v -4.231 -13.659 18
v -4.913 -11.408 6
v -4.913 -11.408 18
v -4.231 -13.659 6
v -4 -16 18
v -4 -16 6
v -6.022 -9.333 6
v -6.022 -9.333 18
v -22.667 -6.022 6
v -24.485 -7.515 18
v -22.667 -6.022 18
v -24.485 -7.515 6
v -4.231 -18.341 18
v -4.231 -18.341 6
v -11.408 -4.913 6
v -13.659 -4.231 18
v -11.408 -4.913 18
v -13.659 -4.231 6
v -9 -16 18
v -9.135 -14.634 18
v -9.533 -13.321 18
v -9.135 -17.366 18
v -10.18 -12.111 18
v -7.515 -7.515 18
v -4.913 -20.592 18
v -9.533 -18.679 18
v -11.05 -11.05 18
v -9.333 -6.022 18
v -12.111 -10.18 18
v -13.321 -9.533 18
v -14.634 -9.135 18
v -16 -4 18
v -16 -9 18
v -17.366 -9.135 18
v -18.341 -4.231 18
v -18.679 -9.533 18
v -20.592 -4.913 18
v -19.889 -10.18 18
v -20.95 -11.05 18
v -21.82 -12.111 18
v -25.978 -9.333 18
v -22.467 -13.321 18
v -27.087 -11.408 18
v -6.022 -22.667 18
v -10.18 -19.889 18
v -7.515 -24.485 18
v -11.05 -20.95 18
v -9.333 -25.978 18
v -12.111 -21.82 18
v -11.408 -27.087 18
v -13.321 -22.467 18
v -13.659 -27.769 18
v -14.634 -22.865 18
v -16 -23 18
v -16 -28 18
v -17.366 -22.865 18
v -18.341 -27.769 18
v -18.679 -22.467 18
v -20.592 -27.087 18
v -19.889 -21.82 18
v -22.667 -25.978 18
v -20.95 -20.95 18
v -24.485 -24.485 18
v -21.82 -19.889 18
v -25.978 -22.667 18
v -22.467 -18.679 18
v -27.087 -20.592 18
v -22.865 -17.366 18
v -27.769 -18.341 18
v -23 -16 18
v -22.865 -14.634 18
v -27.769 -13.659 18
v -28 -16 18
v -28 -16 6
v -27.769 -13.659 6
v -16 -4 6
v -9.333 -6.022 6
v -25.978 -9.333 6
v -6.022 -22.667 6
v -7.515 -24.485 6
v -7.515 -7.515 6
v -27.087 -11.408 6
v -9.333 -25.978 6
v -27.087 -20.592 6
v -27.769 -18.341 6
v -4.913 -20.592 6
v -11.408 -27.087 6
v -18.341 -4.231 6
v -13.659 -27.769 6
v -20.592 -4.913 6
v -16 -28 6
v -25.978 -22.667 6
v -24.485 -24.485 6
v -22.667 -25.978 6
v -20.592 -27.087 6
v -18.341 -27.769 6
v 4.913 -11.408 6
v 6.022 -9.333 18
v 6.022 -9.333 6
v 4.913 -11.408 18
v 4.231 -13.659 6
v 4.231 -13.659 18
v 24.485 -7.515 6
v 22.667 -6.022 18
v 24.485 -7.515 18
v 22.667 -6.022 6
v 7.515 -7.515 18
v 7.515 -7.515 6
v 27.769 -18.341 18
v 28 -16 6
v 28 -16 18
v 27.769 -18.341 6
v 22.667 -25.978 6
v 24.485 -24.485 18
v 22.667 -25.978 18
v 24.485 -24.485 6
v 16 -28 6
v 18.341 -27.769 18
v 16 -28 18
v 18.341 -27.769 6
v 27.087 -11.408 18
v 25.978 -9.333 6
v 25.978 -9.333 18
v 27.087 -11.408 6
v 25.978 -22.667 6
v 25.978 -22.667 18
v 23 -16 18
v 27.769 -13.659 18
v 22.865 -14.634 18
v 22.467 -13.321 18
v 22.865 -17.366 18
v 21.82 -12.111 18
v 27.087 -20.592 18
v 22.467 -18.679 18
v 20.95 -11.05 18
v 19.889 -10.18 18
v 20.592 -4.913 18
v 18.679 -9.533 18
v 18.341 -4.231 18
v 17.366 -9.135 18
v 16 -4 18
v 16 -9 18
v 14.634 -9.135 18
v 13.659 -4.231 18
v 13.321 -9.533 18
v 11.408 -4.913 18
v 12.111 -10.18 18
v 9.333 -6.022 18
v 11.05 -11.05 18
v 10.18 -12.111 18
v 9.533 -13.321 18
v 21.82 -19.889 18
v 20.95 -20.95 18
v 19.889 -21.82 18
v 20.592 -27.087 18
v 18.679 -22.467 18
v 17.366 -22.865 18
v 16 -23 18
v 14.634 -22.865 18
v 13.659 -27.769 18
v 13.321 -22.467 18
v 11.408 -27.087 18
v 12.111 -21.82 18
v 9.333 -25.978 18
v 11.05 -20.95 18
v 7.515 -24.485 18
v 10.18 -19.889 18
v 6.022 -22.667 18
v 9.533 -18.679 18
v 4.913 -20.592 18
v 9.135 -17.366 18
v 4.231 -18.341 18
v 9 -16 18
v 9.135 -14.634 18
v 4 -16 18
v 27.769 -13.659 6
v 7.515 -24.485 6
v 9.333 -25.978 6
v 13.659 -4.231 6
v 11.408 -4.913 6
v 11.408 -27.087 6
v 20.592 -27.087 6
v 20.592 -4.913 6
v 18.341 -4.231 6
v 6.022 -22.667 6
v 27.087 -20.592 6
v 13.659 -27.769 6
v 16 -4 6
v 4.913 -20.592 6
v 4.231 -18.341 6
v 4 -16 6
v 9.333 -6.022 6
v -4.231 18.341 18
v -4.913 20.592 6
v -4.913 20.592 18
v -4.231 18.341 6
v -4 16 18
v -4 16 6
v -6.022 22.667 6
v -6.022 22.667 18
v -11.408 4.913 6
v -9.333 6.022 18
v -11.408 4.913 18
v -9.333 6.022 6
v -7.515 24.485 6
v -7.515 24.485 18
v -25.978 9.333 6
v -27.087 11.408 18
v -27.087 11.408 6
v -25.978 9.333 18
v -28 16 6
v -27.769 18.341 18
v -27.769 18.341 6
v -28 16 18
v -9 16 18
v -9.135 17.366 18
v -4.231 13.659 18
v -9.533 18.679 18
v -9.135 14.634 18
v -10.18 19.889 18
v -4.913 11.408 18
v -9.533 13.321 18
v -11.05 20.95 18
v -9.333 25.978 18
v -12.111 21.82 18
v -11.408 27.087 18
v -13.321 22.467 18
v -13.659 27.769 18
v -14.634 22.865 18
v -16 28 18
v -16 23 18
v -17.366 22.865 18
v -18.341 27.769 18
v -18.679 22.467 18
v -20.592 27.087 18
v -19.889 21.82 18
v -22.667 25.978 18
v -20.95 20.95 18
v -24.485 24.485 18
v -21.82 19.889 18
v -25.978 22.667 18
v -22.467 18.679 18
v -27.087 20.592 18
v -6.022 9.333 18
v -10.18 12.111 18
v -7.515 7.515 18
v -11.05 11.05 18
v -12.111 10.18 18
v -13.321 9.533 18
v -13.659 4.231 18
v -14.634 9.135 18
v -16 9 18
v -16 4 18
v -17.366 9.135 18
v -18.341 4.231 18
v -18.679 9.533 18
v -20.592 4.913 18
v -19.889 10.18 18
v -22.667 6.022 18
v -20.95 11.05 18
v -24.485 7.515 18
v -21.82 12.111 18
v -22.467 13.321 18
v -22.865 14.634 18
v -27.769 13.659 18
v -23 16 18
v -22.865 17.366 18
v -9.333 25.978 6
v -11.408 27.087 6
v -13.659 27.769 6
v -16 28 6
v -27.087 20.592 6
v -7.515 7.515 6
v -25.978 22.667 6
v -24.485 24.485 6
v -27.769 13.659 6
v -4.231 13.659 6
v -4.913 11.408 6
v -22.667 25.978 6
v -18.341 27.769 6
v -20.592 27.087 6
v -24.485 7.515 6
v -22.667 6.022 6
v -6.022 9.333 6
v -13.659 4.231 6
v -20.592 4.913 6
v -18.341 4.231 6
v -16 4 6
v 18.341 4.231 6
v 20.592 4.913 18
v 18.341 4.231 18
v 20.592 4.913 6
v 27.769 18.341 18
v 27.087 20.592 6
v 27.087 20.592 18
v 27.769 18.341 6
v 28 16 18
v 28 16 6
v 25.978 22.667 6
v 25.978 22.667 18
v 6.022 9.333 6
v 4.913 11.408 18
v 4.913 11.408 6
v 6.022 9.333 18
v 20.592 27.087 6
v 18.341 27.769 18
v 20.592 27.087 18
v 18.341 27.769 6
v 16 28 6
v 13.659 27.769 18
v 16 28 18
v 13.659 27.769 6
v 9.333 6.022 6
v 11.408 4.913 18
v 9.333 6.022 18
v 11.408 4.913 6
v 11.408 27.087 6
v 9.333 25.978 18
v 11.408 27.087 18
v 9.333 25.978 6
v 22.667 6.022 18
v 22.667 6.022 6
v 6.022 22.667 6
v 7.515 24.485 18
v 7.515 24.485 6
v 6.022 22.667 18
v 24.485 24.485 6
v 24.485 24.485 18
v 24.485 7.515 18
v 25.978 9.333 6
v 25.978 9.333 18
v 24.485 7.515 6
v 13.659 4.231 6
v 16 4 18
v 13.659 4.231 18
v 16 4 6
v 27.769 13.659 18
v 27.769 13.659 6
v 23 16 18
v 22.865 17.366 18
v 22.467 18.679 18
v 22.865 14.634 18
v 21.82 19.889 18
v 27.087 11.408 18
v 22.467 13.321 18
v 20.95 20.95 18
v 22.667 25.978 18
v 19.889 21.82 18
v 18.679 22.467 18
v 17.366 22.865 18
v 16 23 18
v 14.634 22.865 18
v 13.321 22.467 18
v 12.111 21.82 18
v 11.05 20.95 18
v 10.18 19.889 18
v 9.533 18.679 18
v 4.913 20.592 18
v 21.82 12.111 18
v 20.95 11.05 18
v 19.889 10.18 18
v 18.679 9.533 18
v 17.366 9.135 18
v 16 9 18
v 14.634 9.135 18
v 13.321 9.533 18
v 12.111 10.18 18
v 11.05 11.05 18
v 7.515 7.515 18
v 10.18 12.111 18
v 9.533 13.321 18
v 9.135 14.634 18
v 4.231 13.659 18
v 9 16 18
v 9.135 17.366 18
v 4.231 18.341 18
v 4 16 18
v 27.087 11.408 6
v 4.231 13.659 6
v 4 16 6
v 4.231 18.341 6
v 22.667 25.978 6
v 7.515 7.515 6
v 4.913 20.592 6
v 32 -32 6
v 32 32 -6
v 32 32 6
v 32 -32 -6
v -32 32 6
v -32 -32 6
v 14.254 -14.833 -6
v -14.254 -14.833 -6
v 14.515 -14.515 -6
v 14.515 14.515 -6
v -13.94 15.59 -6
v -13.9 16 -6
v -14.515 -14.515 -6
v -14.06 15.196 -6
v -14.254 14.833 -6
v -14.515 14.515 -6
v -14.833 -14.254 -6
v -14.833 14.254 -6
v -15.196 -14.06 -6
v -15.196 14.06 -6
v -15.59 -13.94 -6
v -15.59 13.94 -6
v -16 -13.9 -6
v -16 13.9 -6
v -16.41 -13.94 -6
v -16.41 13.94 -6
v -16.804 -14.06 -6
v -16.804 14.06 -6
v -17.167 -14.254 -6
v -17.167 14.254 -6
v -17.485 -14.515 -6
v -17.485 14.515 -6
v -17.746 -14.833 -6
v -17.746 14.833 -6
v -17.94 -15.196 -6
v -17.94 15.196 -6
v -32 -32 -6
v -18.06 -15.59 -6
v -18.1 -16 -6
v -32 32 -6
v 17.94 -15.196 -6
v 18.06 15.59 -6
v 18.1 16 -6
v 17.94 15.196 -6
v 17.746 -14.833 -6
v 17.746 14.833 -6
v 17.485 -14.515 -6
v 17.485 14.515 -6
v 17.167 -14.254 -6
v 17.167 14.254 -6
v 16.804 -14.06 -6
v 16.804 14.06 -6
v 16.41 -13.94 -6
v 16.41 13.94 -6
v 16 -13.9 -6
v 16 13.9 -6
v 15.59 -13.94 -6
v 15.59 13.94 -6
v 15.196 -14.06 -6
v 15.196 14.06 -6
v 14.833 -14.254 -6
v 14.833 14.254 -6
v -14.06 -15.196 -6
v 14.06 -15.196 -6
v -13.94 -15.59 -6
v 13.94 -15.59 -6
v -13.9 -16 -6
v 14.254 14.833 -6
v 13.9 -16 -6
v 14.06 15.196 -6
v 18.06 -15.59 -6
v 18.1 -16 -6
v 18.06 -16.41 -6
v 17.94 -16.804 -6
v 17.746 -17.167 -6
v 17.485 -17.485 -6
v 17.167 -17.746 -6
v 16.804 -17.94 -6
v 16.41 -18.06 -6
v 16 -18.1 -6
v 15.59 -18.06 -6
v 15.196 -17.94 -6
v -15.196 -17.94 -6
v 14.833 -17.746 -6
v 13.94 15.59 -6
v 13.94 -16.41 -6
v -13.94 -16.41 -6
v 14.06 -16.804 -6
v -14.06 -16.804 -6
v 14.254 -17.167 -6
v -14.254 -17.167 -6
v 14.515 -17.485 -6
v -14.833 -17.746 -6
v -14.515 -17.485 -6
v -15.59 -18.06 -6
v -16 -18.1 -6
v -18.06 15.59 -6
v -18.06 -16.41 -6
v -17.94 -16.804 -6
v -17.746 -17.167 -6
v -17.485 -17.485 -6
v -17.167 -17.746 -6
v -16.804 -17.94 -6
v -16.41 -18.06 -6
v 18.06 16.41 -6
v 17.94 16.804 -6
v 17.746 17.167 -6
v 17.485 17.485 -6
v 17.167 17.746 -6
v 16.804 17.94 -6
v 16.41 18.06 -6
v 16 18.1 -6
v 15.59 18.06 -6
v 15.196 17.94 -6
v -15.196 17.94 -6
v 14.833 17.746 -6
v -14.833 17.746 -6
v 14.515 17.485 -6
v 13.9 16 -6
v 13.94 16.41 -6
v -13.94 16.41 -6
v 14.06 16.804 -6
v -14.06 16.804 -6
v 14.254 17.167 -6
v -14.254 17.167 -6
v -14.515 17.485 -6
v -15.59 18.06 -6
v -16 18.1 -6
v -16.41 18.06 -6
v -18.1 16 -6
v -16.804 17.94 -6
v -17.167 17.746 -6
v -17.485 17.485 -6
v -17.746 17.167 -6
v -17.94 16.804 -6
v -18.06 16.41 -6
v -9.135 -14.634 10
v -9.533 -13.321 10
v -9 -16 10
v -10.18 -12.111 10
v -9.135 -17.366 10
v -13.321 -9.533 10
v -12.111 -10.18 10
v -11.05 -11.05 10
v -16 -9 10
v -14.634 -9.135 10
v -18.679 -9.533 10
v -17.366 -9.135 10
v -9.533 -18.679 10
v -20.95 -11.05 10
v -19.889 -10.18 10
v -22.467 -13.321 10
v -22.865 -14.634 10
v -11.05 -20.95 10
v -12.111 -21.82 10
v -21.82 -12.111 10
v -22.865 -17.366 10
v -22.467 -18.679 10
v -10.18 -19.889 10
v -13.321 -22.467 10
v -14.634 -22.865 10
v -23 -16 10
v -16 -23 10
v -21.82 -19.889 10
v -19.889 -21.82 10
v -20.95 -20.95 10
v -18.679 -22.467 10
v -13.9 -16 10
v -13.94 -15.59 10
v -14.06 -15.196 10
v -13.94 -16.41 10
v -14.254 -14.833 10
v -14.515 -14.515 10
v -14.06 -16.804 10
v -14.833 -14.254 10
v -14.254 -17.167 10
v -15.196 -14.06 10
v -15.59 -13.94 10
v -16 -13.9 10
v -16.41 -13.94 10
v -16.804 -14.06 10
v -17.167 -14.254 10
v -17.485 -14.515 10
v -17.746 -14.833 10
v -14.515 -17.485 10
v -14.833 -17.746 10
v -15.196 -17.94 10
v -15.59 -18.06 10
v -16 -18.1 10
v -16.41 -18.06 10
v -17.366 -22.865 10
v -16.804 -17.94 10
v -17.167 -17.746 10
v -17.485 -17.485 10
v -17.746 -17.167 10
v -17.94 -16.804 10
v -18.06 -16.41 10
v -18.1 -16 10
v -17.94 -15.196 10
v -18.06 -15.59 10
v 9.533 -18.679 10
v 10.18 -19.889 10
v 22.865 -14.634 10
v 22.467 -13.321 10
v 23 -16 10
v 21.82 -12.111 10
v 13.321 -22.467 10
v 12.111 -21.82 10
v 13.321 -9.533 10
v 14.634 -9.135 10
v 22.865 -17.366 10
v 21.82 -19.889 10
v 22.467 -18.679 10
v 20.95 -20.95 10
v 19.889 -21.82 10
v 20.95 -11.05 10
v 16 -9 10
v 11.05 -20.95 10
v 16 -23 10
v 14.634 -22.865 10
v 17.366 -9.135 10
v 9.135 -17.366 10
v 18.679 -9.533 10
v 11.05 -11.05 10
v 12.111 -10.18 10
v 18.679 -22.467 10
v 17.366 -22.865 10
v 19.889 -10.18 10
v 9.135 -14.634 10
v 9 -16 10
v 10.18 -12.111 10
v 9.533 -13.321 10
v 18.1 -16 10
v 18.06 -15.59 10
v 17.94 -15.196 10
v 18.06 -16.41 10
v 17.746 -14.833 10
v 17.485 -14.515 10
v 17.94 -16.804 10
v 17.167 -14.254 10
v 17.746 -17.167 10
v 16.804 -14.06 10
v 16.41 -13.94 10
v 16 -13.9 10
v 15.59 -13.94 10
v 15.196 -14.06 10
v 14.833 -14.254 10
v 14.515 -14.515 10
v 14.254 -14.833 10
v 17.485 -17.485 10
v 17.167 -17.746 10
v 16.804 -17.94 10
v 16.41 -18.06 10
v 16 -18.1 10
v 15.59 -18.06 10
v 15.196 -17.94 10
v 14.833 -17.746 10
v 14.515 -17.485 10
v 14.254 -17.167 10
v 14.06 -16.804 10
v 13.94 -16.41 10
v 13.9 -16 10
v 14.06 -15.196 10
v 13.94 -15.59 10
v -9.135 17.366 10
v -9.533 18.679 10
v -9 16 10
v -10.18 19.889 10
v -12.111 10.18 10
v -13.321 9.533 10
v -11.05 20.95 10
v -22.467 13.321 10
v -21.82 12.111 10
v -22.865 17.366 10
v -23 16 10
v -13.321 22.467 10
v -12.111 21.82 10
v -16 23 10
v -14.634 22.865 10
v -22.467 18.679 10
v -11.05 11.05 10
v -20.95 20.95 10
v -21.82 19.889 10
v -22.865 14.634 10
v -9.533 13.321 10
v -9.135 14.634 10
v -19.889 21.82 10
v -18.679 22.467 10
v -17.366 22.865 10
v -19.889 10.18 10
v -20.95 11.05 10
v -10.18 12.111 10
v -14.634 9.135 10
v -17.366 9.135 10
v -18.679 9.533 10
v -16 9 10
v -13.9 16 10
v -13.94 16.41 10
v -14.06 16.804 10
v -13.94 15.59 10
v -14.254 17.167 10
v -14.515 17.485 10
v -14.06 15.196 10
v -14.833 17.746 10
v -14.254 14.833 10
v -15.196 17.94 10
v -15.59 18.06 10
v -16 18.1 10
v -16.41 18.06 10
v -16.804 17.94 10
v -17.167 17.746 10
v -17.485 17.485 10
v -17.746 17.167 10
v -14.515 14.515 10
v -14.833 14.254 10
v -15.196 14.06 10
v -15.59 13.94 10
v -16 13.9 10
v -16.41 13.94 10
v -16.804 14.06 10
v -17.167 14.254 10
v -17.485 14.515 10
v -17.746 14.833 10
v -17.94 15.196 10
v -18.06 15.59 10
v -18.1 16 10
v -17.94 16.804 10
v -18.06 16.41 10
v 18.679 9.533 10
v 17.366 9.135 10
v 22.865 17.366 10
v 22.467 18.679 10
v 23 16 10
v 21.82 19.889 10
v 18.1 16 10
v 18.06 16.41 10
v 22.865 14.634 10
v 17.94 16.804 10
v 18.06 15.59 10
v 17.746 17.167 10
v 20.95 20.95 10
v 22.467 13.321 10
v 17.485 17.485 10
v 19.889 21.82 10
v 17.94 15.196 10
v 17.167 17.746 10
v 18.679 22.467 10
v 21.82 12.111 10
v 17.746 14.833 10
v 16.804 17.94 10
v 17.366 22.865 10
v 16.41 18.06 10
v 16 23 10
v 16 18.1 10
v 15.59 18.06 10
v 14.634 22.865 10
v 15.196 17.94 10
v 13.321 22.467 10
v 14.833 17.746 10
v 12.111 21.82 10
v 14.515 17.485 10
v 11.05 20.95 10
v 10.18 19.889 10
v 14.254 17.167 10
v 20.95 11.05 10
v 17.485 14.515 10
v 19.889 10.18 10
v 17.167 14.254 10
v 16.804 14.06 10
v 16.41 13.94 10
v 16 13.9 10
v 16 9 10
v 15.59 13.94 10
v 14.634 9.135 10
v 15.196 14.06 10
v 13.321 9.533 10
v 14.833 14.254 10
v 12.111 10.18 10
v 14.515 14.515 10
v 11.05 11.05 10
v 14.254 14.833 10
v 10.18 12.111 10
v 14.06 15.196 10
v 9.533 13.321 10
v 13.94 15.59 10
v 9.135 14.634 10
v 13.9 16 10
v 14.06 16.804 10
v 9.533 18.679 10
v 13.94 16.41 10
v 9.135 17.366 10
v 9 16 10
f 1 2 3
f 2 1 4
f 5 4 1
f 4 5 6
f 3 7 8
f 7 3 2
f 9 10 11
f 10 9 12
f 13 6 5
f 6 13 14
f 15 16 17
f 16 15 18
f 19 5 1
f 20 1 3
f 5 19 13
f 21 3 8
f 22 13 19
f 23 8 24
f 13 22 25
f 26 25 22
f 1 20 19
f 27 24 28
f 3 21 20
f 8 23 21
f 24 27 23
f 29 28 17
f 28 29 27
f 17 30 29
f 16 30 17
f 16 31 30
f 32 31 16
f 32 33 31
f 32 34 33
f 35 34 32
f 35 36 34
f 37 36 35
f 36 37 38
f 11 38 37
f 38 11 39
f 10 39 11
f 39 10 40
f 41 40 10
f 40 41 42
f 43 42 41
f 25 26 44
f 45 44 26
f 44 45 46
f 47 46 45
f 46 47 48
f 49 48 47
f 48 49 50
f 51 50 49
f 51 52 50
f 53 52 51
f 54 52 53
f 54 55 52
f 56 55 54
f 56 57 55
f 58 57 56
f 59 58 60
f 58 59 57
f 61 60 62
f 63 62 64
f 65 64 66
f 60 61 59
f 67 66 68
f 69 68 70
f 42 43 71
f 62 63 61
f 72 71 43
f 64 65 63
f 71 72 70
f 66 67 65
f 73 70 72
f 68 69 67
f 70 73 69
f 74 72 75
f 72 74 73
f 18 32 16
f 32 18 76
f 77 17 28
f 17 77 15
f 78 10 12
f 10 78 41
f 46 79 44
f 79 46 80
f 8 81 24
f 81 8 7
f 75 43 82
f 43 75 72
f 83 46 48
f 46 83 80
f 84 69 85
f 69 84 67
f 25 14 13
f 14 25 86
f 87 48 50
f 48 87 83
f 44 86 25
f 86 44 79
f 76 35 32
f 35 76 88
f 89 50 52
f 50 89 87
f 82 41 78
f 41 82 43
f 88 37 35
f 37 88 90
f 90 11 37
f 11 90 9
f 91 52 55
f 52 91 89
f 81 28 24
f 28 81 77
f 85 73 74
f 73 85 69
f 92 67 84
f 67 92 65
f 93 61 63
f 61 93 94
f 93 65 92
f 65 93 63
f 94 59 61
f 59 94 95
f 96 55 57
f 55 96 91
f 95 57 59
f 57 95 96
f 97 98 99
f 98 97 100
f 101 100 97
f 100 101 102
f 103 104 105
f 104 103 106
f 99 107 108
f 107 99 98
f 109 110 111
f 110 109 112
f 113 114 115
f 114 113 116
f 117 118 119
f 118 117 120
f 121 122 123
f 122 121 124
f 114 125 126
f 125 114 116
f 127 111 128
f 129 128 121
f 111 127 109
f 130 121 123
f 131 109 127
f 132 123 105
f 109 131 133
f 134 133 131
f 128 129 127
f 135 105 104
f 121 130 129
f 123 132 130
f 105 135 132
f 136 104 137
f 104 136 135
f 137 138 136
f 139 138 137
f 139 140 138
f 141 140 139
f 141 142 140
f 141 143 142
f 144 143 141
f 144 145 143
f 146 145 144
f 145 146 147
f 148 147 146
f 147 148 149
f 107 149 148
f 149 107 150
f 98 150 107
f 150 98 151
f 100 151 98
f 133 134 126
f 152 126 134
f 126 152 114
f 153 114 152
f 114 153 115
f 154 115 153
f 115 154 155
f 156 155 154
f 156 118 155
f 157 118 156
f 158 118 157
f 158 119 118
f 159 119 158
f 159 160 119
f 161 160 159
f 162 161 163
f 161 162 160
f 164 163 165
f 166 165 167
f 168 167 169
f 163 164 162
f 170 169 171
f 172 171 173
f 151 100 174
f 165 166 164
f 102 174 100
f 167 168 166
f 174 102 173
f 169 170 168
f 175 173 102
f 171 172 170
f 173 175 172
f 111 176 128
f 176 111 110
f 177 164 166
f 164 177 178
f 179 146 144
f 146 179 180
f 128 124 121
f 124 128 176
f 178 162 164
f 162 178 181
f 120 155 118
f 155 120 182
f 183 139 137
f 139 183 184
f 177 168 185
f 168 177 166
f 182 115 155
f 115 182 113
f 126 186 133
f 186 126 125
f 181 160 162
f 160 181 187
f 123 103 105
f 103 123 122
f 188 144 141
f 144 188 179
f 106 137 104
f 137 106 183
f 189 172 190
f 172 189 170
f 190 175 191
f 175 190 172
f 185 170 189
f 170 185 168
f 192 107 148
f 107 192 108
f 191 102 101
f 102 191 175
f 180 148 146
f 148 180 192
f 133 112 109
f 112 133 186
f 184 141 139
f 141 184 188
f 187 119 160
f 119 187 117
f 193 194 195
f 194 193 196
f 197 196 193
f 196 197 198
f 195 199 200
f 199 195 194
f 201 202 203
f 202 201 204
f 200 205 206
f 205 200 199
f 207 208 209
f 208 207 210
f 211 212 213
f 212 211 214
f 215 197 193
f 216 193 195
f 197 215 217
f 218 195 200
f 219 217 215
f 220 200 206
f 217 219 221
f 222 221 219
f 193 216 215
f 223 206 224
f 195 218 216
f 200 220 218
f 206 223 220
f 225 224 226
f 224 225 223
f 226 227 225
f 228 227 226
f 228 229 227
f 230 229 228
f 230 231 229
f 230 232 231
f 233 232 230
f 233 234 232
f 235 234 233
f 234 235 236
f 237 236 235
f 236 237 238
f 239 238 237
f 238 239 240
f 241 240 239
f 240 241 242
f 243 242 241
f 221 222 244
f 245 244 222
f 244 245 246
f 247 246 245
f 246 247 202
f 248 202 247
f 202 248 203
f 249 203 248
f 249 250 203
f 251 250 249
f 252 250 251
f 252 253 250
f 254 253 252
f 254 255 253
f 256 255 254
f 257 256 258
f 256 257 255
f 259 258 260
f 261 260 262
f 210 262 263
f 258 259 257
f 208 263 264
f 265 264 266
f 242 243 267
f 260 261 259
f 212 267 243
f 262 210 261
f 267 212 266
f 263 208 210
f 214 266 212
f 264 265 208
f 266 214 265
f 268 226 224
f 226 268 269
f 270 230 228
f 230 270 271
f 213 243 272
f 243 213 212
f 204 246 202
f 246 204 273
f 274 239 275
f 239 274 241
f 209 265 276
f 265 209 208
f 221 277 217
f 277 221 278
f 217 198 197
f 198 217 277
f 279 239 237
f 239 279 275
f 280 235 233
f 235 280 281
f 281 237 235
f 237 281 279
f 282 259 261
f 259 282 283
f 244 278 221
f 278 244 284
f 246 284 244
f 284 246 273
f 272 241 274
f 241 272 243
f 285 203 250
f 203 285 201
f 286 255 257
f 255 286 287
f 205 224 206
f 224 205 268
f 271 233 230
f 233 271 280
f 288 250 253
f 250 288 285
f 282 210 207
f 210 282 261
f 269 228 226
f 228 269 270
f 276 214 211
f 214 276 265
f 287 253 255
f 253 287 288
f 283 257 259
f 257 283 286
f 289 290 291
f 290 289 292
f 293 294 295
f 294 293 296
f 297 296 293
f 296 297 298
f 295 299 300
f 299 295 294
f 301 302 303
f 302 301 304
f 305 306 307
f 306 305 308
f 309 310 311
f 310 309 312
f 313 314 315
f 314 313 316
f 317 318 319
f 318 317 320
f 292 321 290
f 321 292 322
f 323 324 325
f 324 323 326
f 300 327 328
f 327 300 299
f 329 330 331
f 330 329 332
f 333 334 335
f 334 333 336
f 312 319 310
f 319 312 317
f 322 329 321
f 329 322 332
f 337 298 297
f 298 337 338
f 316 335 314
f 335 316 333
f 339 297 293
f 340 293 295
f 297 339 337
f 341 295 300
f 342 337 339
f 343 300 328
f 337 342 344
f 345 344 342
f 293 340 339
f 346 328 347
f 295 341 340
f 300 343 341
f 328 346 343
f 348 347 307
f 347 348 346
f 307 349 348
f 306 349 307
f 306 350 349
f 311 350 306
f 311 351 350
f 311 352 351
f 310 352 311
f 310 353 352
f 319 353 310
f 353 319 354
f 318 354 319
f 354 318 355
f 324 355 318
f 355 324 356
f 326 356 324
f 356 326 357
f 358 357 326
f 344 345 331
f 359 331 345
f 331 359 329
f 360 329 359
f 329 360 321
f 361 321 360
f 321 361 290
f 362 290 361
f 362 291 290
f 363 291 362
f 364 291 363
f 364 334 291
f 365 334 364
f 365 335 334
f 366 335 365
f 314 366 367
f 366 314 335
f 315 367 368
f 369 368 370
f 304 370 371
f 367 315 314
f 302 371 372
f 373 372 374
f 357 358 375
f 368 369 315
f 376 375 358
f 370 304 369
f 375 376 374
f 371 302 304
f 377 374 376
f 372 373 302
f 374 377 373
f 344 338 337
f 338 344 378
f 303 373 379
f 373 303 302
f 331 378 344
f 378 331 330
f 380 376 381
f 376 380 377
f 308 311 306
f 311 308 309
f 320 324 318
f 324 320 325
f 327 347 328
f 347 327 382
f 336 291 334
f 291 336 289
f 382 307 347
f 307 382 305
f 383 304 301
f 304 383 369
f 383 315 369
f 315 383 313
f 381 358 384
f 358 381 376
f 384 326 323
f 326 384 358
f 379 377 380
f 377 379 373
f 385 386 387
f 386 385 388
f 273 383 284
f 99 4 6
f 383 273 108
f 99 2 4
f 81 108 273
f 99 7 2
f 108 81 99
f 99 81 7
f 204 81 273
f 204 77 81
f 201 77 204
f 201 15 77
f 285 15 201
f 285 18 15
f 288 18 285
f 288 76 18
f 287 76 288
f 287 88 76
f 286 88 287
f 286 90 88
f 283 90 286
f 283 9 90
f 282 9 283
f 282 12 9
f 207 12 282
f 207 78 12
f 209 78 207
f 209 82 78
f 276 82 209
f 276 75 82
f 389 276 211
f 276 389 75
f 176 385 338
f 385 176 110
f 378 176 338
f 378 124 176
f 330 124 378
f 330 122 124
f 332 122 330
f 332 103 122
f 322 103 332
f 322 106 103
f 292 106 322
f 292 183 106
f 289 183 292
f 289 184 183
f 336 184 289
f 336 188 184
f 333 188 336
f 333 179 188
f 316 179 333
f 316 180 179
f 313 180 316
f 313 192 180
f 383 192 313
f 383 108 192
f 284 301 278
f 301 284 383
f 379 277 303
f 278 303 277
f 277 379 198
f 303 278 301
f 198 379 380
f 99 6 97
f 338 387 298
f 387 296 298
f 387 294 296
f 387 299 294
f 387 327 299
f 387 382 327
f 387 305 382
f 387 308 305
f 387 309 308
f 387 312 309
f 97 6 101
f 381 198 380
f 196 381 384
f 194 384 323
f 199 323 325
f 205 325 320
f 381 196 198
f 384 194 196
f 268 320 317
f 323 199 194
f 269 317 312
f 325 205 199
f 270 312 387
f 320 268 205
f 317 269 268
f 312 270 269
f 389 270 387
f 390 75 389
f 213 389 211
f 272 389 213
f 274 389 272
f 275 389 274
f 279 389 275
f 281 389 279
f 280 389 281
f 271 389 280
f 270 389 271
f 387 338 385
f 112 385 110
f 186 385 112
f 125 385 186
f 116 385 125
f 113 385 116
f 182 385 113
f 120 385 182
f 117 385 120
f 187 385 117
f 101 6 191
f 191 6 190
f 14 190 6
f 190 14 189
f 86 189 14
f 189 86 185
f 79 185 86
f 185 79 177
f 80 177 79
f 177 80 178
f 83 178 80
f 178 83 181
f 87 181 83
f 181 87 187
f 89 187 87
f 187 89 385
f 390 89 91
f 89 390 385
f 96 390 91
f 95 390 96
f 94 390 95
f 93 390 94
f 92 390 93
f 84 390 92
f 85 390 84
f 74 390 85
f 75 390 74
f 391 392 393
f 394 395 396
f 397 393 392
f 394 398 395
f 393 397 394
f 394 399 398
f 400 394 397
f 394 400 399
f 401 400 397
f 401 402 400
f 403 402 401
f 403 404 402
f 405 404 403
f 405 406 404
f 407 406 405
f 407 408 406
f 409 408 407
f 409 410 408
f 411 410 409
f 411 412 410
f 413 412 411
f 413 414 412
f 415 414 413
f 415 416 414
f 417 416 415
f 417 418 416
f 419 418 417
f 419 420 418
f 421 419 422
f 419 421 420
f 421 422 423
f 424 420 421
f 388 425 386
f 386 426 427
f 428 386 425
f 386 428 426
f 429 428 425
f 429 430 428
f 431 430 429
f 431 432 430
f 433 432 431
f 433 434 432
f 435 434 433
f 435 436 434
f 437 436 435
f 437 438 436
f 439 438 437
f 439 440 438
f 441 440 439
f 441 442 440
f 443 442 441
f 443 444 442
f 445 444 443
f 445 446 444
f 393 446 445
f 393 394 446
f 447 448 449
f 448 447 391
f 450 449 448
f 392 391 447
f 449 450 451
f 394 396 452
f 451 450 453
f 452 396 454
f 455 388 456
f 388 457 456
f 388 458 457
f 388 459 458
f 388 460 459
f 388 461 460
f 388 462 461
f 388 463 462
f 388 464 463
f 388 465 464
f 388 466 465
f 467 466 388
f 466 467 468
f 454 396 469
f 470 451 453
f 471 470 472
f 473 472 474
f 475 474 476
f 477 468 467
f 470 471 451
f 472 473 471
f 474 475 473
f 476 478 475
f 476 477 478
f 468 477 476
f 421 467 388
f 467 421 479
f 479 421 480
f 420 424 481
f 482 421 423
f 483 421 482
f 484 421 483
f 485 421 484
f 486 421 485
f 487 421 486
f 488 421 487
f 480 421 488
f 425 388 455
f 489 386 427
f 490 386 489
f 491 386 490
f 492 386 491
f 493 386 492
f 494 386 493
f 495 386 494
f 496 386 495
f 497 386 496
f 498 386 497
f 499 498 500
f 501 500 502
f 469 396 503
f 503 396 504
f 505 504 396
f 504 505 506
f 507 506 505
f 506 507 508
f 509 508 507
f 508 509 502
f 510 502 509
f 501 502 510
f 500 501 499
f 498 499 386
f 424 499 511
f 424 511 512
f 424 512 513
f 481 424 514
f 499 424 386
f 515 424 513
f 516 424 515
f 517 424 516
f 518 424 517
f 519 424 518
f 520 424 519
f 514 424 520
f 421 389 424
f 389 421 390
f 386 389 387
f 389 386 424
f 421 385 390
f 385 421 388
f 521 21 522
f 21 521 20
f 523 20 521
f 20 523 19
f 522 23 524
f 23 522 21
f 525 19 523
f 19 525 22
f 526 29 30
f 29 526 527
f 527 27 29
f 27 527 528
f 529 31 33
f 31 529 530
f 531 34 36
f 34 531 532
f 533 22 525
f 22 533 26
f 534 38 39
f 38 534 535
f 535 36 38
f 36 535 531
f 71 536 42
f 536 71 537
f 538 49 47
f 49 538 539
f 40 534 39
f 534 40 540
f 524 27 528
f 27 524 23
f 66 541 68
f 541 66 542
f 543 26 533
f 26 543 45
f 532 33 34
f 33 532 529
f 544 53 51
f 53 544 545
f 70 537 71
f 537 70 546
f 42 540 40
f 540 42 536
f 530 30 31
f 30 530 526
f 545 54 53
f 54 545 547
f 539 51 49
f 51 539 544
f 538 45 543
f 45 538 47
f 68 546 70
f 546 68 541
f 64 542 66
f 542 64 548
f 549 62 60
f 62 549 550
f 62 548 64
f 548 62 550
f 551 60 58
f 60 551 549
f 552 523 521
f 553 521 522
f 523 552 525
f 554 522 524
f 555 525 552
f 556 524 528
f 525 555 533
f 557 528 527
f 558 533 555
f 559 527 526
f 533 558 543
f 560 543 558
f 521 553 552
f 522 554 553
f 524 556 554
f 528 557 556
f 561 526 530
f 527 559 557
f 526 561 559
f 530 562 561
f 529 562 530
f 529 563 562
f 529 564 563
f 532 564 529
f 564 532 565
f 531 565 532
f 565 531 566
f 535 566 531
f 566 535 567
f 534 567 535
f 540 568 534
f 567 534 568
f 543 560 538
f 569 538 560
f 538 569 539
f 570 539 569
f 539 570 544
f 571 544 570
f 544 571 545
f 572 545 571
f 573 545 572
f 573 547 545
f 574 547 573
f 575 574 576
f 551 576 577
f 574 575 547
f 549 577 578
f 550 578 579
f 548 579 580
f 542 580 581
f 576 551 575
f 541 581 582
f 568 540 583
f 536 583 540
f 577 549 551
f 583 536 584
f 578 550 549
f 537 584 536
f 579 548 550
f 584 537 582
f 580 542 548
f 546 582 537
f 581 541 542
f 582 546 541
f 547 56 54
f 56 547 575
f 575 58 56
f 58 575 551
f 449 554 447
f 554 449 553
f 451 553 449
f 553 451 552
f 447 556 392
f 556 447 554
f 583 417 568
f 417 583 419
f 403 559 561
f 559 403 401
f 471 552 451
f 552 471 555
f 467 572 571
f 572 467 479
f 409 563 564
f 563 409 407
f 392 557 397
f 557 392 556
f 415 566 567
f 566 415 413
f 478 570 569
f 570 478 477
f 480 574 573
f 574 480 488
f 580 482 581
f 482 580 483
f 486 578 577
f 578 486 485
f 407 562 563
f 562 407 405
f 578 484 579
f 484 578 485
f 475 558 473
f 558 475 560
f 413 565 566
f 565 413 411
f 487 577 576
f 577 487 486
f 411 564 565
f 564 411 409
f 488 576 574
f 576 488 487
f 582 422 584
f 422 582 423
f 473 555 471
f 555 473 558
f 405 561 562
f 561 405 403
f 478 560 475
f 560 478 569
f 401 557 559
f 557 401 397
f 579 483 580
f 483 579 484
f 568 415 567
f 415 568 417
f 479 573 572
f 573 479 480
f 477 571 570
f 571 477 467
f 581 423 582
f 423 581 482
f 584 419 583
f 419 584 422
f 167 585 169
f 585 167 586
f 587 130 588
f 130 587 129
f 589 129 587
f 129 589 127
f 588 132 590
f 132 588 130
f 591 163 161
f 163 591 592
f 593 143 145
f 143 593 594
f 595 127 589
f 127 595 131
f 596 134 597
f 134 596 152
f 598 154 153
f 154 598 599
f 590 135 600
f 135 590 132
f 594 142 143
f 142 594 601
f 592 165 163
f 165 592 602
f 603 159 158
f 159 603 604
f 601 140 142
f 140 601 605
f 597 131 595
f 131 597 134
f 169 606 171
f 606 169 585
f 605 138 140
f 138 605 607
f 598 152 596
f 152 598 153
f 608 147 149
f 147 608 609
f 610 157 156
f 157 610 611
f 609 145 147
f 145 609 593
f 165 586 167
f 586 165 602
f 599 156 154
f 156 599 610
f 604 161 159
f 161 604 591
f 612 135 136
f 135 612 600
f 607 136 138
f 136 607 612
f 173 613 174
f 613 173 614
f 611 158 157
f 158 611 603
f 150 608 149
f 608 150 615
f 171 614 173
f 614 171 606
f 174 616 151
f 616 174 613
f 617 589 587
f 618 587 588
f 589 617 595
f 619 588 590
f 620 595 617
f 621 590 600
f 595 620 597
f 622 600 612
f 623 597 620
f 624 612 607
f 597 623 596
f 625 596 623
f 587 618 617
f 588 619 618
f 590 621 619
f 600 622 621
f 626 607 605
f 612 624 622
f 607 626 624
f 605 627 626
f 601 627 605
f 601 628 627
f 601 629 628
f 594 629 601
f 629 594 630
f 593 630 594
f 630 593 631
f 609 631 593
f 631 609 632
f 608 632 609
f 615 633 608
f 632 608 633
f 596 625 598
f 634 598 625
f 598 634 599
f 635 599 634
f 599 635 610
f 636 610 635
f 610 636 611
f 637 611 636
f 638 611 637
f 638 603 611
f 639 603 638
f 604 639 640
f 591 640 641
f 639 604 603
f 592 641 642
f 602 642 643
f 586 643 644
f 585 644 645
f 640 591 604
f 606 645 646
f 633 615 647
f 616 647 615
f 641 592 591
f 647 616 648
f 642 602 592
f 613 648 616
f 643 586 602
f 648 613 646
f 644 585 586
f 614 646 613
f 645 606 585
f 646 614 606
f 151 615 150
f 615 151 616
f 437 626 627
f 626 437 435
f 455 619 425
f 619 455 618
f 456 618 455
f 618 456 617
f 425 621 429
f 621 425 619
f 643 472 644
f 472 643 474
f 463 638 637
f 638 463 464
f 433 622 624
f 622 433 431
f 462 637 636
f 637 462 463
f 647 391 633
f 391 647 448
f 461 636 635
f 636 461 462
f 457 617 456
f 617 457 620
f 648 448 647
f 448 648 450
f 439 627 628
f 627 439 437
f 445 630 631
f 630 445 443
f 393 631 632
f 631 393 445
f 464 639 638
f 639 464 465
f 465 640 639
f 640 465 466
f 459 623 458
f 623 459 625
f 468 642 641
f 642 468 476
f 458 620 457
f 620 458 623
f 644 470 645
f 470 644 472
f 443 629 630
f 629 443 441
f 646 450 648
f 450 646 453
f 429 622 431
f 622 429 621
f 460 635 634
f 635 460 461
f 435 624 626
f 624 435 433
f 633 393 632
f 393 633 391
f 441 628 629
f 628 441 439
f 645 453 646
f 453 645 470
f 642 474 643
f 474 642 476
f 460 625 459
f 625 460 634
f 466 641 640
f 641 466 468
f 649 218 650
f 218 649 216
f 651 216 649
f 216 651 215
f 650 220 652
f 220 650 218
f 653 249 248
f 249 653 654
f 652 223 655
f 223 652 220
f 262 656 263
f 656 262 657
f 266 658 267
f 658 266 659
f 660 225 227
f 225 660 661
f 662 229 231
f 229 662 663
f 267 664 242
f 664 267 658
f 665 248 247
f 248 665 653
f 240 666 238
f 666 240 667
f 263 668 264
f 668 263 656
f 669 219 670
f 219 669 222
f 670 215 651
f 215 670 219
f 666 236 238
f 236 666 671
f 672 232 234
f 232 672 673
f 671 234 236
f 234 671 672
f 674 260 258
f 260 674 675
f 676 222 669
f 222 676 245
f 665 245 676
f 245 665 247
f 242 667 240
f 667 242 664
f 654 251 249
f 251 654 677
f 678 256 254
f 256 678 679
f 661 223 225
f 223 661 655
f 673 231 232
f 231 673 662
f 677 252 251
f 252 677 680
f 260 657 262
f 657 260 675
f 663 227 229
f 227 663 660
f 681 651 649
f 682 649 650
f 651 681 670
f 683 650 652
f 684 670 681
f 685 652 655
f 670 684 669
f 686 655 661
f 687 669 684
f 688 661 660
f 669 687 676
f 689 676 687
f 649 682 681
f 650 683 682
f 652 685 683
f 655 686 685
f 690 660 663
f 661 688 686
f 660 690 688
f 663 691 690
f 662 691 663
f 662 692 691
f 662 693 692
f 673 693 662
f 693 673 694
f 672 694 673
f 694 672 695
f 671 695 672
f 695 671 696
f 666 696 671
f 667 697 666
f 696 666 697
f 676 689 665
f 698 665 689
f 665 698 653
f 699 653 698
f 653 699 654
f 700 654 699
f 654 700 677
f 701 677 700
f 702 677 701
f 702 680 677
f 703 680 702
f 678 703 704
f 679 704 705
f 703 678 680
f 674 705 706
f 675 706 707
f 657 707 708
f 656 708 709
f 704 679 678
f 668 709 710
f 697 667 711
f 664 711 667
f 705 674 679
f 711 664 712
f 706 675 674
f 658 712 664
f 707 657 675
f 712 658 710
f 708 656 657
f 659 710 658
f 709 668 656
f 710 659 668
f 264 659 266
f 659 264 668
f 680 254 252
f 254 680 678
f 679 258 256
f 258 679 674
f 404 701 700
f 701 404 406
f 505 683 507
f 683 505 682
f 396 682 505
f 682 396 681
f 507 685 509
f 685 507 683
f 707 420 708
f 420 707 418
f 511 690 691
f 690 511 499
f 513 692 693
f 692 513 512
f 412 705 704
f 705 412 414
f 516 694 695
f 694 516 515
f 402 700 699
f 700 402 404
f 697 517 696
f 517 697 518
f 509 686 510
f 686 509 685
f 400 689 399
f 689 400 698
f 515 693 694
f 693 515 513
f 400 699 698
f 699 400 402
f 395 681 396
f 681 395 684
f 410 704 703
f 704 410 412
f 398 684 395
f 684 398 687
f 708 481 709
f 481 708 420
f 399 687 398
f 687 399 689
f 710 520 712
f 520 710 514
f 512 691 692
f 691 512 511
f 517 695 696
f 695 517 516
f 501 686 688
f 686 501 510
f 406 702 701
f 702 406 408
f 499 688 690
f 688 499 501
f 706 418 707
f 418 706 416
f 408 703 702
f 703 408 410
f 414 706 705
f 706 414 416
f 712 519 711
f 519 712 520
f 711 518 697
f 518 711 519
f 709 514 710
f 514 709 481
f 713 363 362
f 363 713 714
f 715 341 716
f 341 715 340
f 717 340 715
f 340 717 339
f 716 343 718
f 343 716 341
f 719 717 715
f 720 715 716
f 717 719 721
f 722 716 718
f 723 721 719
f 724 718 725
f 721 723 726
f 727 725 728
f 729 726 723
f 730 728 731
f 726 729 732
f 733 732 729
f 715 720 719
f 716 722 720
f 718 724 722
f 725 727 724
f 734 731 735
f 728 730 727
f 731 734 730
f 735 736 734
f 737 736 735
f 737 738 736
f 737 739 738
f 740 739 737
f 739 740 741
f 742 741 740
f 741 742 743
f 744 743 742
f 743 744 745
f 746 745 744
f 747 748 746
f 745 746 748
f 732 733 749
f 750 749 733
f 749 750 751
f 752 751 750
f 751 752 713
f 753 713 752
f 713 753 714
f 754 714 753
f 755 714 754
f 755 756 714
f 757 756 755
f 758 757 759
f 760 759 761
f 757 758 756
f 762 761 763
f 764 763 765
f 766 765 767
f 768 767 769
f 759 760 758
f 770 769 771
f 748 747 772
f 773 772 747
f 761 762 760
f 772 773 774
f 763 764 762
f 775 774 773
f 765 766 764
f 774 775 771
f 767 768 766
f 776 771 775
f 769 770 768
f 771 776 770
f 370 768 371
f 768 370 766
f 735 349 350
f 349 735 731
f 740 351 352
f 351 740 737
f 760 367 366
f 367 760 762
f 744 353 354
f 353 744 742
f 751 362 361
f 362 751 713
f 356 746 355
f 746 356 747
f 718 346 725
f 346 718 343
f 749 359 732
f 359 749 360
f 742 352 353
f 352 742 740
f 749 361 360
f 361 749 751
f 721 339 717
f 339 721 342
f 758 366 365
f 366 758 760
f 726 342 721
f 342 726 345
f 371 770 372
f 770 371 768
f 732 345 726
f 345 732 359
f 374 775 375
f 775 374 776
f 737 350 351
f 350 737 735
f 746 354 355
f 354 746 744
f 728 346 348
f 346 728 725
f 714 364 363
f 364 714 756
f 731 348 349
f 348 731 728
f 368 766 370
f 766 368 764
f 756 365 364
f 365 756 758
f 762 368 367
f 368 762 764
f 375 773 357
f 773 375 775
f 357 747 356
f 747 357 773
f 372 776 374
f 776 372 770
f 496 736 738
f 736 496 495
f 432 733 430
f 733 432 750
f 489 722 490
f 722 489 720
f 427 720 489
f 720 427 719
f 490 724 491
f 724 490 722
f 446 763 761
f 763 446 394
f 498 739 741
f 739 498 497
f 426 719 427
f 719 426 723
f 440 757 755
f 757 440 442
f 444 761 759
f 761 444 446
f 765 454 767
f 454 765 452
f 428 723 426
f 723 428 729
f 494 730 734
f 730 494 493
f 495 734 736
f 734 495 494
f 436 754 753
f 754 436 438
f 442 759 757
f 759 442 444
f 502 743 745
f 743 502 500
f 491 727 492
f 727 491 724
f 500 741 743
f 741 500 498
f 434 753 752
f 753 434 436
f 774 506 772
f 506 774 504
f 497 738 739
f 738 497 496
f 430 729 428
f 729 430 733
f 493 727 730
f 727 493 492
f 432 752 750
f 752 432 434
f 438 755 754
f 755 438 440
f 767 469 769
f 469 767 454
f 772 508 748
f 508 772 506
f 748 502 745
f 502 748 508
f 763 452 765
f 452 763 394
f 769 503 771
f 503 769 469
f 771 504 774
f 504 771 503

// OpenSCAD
$fn = 32;

// ----------------------------------------------------------------------
// Socket pad plate
// bosses with counterbored sockets for the screws
// ----------------------------------------------------------------------

// --- parameters (mm) ---
base_t = 12;       // base plate thickness
boss_h = 12;       // boss height above the base plate
boss_d = 24;       // boss diameter
socket_d = 14;     // socket diameter
socket_depth = 8;  // socket depth from the boss face
bolt_d = 4.2;      // screw clearance hole through the socket floor
rows = 2;          // boss rows
cols = 2;          // bosses per row
pitch = 32;        // boss pitch

// --- derived feature positions (mm) ---
height = base_t + boss_h;           // = 24   overall height of the part
plate = [pitch * (cols - 1) + boss_d + 8, pitch * (rows - 1) + boss_d + 8, base_t];  // = [64, 64, 12]   overall size (x, y, z)
span_x = pitch * (cols - 1);        // = 32   distance between outer bosses
span_y = pitch * (rows - 1);        // = 32   distance between boss rows
origin_x = -span_x / 2;             // = -16   X of the first boss
origin_y = -span_y / 2;             // = -16   Y of the first boss
feature_centers = [
  [origin_x + 0 * pitch, origin_y + 0 * pitch],
  [origin_x + 1 * pitch, origin_y + 0 * pitch],
  [origin_x + 0 * pitch, origin_y + 1 * pitch],
  [origin_x + 1 * pitch, origin_y + 1 * pitch]
];   // boss centres: sockets, holes and the pads themselves are placed from here

// base plate, bosses on feature_centers, socket + through hole in each
difference() {
  union() {
    cube(plate, center = true);
    for (centre = feature_centers)
      translate([centre[0], centre[1], plate[2] / 2 - 1])
        cylinder(d = boss_d, h = boss_h + 1);
  }
  for (centre = feature_centers) {
    translate([centre[0], centre[1], plate[2] / 2 + boss_h - socket_depth])
      cylinder(d = socket_d, h = socket_depth + 1);
    translate([centre[0], centre[1], -height])
      cylinder(d = bolt_d, h = 2 * height + 2);  // through the socket floor
  }
}
